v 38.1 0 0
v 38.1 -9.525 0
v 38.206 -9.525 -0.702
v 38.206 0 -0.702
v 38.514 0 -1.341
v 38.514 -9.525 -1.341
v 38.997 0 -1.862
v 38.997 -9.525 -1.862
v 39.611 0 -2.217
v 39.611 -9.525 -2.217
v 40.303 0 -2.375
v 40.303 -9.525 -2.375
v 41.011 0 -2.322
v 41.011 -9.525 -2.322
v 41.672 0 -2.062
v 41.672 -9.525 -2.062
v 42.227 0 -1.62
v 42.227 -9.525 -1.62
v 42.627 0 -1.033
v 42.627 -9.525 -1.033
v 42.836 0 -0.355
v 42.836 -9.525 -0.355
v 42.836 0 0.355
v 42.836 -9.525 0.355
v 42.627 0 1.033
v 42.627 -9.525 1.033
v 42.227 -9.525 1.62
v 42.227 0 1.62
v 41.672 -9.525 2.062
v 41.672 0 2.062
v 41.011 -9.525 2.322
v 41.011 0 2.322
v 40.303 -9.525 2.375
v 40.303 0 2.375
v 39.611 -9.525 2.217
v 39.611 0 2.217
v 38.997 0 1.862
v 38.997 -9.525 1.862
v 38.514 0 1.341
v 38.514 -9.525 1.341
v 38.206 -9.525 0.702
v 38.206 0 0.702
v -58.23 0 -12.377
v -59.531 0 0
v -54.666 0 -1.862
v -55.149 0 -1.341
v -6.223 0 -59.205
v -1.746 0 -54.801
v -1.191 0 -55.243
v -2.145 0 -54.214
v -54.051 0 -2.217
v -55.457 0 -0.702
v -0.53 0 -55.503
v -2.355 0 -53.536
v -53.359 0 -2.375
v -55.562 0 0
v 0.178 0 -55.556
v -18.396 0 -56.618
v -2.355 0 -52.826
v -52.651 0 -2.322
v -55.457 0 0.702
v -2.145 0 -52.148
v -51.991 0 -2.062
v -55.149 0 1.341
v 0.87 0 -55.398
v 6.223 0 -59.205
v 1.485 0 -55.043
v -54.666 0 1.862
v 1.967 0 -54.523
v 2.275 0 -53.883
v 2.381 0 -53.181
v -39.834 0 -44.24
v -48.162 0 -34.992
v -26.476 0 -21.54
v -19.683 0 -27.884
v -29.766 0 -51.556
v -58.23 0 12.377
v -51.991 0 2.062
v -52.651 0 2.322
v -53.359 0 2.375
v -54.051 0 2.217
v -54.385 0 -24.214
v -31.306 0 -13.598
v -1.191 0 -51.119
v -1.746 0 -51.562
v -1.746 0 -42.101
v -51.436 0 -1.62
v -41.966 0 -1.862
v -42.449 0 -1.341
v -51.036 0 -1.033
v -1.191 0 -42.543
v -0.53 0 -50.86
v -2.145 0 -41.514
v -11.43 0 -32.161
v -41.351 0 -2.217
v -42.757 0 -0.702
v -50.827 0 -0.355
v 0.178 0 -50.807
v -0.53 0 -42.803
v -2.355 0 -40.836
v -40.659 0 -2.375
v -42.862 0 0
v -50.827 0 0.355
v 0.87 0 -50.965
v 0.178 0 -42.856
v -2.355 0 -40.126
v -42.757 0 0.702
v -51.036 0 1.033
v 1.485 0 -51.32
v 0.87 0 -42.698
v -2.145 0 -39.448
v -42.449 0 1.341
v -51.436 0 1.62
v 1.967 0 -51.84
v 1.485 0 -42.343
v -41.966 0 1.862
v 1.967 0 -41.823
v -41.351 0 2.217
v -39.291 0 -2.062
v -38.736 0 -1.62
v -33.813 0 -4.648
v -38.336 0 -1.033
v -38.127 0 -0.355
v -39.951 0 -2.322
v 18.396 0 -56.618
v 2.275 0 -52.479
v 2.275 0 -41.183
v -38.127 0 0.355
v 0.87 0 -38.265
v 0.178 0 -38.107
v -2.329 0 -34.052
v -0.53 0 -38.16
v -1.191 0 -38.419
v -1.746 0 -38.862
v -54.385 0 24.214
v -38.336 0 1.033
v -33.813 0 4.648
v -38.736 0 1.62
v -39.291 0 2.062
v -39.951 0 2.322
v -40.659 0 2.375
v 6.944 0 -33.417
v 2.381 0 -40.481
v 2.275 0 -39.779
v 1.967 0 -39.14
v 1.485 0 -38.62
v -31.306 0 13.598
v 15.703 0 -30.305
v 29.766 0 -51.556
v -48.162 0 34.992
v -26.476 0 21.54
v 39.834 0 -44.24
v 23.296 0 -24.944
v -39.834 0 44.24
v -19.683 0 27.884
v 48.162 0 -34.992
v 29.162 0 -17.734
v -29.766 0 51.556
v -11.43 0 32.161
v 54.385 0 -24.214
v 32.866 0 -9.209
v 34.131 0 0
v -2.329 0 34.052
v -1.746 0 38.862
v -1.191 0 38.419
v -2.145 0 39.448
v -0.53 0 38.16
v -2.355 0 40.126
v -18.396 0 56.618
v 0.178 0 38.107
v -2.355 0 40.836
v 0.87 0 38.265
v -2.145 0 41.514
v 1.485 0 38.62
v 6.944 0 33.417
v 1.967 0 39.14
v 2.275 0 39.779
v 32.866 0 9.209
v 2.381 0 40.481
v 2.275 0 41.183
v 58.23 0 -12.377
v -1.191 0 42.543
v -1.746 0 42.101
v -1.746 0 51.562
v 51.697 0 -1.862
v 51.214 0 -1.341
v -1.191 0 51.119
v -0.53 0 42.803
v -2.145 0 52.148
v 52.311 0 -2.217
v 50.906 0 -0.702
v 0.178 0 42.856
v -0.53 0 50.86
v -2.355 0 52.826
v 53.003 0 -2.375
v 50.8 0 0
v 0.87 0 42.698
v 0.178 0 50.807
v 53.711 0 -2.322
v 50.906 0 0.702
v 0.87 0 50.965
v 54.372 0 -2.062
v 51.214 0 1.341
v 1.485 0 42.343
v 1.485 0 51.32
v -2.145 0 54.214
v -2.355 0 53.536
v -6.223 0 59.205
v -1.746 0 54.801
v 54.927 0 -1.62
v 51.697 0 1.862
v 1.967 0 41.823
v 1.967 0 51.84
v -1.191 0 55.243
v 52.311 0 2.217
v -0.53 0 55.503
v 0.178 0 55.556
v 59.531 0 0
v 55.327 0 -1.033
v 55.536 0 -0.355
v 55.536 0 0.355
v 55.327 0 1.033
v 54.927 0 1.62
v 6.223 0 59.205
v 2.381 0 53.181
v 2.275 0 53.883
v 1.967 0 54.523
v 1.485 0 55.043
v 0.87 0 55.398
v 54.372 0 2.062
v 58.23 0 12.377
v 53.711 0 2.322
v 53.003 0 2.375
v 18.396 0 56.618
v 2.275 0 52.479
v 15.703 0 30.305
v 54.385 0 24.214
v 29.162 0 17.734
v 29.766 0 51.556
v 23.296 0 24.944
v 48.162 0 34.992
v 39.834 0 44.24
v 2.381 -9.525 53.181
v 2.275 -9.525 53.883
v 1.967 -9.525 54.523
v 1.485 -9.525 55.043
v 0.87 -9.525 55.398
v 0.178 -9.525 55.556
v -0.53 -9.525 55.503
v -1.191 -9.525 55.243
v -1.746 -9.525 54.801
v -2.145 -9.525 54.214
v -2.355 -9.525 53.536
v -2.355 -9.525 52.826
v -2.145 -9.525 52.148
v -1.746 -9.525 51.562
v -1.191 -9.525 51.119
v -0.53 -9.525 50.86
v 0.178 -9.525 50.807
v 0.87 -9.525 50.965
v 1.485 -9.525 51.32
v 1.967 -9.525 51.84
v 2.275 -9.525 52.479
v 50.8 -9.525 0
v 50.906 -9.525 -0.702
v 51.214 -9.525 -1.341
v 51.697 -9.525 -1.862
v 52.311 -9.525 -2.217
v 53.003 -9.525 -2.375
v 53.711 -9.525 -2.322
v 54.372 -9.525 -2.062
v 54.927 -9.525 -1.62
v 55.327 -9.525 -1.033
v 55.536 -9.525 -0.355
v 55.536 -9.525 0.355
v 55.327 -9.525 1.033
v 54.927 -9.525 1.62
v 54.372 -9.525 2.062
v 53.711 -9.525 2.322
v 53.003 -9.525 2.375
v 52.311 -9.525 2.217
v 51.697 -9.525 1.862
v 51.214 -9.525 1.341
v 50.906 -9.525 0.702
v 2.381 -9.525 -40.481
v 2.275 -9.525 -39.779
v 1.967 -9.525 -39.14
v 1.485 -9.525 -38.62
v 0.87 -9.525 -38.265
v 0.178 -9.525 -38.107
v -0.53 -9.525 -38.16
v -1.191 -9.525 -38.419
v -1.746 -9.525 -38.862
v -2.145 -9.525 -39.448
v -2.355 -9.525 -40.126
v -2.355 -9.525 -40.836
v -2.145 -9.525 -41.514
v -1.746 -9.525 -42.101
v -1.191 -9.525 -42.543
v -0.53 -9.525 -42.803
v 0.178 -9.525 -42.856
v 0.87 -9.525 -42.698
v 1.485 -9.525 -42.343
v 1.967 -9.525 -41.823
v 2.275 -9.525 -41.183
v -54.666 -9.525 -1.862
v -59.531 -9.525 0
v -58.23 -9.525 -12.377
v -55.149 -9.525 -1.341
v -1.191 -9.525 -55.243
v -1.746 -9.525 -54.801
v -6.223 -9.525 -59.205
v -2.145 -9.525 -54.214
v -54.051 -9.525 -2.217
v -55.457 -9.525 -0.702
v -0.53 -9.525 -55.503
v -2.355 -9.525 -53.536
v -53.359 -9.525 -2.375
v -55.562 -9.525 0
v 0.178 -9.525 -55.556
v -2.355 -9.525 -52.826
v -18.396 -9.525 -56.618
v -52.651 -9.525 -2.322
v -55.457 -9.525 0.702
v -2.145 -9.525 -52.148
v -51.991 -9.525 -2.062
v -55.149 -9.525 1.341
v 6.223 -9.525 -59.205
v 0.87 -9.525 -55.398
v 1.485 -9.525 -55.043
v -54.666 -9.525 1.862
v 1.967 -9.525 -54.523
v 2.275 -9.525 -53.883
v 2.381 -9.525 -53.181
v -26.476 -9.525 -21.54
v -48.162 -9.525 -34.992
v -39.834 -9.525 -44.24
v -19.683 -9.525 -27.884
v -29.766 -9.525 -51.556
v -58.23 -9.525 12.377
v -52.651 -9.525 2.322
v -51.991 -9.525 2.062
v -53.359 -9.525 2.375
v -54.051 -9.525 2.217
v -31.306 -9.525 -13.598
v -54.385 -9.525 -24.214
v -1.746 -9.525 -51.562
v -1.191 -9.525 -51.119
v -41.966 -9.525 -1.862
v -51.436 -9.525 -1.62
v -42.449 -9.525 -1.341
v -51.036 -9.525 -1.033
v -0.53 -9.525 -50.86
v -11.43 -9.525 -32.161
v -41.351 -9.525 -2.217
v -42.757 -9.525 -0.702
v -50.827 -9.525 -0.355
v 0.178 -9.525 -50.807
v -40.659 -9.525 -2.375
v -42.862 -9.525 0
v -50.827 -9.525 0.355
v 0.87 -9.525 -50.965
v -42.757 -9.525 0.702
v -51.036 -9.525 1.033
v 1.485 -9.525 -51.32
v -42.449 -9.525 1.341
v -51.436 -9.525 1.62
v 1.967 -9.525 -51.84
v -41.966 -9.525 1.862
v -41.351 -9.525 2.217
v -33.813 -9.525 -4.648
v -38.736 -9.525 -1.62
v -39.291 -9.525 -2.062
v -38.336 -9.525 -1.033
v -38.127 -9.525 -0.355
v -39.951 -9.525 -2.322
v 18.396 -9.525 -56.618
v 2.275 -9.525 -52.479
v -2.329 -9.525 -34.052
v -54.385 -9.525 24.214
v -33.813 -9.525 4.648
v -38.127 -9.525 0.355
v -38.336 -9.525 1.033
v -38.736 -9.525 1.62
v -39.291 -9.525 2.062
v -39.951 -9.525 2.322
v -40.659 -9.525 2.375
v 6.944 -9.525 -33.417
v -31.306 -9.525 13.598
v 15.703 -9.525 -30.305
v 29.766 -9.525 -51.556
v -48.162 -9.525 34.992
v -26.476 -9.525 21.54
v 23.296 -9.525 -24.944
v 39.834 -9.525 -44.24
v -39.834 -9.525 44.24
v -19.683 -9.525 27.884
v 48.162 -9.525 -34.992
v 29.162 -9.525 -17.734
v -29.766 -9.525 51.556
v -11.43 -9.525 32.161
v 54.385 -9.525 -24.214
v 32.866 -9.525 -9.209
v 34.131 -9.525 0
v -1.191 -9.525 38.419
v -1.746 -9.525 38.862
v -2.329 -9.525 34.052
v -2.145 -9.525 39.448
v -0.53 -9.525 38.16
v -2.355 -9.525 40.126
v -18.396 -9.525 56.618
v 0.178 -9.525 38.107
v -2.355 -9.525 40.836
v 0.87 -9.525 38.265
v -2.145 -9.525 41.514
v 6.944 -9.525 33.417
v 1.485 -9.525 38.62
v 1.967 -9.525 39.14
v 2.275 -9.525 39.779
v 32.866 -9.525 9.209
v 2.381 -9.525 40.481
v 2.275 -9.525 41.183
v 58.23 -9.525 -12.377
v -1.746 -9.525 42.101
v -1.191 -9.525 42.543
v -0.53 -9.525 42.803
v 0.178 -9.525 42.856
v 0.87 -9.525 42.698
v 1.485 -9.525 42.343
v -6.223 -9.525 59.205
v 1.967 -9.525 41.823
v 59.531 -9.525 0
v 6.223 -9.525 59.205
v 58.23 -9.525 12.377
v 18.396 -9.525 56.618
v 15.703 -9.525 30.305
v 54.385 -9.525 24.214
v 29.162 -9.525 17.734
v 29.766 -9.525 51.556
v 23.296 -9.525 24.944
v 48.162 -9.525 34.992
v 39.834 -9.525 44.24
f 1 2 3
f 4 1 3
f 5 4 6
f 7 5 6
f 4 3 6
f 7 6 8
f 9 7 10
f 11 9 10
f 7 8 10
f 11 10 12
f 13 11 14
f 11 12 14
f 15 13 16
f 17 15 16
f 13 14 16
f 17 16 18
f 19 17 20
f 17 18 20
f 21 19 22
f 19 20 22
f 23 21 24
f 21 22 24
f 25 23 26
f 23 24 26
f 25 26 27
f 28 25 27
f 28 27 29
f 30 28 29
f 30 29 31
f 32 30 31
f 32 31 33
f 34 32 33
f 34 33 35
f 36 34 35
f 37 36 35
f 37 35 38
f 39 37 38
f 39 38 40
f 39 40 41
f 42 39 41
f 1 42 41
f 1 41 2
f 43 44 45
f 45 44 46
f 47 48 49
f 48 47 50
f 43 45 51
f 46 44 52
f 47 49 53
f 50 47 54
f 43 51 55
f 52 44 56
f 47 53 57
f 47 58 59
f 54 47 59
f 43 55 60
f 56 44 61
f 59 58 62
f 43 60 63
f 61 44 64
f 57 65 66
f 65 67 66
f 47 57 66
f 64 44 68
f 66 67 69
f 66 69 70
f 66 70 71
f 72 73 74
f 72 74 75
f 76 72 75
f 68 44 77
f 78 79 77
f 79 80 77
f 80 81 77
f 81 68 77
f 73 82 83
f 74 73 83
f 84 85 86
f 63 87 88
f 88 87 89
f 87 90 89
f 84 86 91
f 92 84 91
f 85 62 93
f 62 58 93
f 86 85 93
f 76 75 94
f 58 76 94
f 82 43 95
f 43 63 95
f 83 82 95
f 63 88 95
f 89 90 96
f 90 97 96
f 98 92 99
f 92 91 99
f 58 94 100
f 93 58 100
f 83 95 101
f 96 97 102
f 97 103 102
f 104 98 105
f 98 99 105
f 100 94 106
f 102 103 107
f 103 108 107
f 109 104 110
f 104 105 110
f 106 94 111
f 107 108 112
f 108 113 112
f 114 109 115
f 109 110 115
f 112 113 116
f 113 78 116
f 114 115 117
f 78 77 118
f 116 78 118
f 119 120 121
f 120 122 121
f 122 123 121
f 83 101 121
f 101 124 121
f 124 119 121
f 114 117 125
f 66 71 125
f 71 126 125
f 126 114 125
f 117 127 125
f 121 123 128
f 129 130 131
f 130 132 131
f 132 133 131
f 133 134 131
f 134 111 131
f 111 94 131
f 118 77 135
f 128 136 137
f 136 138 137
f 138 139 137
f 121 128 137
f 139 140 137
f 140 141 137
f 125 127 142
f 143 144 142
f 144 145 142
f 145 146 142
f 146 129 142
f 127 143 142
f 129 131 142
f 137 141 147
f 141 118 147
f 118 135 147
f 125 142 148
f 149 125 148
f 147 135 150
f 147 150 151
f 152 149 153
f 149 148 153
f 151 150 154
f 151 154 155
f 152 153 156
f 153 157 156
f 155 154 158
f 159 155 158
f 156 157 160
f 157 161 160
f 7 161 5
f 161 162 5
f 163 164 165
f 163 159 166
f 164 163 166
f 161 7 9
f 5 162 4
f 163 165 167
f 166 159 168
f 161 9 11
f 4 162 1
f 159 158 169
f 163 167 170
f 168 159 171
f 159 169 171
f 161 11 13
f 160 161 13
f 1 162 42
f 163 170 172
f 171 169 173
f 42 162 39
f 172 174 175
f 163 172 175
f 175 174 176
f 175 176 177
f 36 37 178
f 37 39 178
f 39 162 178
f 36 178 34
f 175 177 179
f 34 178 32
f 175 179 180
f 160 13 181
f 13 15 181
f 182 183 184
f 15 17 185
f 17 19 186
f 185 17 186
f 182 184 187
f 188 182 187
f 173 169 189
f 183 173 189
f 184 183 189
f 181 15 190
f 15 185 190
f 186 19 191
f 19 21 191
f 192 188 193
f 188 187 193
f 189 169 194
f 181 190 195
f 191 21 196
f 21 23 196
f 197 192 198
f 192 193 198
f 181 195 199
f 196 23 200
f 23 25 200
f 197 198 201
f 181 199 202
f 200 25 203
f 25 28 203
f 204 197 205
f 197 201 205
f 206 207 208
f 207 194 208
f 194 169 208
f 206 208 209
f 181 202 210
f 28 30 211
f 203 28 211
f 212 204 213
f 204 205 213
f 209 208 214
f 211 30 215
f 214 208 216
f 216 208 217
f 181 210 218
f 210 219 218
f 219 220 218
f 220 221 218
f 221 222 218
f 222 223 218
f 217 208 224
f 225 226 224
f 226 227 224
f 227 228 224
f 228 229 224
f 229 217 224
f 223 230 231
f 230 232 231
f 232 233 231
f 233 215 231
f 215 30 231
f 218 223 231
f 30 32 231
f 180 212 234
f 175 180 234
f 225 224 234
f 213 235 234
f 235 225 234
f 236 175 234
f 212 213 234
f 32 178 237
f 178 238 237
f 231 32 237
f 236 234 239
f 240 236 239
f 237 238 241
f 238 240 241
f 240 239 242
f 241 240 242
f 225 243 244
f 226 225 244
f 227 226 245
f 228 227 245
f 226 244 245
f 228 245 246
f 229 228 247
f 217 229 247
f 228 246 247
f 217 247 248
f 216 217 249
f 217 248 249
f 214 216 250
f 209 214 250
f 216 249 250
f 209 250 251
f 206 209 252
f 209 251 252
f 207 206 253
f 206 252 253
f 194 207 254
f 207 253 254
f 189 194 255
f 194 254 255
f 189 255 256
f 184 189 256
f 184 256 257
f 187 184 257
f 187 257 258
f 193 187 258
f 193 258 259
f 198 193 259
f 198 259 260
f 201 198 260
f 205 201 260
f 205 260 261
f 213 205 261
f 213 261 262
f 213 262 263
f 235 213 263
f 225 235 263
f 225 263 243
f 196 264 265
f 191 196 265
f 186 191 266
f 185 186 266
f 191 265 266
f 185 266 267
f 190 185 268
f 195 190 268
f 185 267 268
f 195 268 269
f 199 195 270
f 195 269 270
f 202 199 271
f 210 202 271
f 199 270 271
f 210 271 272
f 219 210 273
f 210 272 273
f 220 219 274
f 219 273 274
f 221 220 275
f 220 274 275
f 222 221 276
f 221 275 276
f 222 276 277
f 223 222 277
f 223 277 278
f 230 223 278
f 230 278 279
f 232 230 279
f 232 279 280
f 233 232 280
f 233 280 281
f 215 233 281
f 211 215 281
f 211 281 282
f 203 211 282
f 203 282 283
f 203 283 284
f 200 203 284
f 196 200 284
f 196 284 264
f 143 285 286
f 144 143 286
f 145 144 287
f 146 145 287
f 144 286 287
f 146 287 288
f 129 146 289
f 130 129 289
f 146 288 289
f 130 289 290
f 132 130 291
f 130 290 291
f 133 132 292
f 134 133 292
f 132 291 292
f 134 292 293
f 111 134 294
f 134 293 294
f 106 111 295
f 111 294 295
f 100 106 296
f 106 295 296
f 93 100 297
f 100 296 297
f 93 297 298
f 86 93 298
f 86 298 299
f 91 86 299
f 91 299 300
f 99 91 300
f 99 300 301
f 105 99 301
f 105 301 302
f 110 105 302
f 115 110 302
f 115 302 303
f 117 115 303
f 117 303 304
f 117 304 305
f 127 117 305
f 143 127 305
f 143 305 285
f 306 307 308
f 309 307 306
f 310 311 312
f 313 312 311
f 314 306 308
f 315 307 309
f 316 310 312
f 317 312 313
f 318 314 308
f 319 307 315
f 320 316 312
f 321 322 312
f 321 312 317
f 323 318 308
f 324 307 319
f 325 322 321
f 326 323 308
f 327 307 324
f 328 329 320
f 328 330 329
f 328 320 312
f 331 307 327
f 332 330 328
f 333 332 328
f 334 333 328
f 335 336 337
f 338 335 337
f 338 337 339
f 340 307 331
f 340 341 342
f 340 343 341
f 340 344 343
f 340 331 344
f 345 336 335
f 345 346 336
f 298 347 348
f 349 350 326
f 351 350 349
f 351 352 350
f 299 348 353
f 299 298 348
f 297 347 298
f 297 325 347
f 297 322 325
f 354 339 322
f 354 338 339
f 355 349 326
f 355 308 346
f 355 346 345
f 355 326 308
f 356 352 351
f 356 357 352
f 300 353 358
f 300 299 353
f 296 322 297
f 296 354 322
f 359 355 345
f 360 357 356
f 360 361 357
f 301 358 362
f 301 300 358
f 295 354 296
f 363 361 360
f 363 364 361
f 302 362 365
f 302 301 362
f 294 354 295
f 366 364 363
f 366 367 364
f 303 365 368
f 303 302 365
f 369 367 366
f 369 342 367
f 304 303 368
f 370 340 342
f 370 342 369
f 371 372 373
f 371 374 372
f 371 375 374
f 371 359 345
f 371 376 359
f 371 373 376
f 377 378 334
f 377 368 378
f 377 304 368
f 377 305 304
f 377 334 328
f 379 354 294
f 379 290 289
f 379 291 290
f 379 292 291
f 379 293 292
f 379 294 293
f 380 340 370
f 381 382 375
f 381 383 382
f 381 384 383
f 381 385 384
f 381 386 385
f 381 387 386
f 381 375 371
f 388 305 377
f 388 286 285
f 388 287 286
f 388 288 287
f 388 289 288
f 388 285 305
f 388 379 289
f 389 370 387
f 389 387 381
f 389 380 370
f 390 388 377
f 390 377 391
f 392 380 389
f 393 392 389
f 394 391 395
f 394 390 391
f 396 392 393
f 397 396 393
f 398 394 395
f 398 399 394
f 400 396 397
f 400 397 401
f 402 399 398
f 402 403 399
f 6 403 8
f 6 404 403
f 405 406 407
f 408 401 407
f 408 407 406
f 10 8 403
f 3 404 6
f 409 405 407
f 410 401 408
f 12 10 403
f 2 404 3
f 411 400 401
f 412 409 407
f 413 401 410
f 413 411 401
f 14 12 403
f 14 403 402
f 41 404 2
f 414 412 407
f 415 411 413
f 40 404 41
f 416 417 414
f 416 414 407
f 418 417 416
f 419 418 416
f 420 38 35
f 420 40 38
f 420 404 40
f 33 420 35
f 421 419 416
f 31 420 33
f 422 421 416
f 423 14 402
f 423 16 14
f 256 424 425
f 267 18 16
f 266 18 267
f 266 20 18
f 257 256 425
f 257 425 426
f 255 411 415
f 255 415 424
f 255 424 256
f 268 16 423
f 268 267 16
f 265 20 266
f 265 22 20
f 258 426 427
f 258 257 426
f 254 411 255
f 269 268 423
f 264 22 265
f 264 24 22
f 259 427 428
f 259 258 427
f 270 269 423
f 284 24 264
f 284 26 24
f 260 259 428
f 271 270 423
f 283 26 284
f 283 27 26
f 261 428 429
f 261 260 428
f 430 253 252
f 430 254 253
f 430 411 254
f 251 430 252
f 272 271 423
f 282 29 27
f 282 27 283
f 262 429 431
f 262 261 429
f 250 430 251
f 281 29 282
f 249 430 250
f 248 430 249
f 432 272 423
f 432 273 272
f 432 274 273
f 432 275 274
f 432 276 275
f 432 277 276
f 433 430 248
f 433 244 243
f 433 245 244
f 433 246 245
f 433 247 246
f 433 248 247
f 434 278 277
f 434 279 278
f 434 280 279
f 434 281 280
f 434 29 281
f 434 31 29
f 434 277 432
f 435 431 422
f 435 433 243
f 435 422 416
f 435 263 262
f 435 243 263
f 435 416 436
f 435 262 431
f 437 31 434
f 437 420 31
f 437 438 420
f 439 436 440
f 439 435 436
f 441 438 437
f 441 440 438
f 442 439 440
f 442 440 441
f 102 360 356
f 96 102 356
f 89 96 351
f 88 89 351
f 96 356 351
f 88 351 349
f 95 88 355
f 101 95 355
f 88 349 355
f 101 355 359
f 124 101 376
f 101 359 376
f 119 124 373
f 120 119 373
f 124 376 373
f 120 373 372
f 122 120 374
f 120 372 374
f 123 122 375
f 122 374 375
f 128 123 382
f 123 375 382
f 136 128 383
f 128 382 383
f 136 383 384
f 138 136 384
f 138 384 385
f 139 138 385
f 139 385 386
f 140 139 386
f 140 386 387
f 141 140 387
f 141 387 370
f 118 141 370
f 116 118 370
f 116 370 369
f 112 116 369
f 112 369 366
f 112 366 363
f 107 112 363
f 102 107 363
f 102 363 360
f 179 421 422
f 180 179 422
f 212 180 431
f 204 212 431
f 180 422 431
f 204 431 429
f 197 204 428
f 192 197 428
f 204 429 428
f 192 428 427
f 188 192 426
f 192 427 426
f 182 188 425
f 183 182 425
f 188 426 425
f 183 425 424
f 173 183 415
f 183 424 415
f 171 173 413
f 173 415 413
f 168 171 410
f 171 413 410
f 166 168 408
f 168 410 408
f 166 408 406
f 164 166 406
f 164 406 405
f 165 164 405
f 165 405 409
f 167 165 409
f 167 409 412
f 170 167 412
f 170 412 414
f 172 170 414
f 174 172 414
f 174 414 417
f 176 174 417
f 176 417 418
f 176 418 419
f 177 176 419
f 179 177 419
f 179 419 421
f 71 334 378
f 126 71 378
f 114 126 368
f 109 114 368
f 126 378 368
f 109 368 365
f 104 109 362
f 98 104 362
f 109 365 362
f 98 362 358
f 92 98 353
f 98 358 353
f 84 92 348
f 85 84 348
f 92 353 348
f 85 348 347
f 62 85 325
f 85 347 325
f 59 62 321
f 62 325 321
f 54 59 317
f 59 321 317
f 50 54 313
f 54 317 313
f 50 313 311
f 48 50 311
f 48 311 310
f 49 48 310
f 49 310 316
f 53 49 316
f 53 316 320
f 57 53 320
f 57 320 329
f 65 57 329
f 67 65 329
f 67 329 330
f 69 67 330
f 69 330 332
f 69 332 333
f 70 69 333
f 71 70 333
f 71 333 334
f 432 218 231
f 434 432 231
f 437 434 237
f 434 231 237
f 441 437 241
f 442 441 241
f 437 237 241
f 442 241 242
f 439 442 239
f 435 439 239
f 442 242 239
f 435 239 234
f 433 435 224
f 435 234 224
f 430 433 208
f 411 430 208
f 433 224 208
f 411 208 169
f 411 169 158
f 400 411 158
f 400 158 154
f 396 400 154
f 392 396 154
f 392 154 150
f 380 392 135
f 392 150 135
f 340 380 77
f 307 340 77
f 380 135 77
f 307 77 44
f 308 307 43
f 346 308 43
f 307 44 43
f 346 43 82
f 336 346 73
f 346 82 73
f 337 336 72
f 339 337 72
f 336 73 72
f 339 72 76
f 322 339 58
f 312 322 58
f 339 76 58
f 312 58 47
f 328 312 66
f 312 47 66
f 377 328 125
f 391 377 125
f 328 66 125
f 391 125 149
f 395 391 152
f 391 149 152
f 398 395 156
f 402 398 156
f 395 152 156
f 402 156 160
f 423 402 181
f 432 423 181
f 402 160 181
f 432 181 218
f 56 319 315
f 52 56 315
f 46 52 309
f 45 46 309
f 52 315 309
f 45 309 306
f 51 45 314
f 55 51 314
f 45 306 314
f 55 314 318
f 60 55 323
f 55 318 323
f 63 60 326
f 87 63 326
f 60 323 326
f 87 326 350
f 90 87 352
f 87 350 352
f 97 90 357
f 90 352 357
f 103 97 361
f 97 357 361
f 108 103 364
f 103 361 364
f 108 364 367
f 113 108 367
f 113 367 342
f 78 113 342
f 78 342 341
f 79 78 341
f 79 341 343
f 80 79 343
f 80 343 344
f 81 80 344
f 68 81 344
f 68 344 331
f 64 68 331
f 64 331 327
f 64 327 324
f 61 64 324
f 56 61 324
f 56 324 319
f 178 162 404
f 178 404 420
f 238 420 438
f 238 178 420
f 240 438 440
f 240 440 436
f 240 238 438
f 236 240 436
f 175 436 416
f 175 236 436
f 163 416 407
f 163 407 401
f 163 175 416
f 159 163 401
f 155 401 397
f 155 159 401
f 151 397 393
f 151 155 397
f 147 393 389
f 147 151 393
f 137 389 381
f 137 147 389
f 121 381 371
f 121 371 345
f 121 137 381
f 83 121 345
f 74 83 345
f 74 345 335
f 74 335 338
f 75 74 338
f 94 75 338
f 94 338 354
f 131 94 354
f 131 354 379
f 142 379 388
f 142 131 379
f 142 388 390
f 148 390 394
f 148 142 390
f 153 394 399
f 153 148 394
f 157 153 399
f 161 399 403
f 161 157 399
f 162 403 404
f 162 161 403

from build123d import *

# Parameters (mm, degrees)
F0_R     = 59.53125
F0_R_2   = 46.83125
F0_R_3   = 34.13125
F1_DEPTH = 9.525
F3_DEPTH = 25.4


with BuildPart() as f1:
    # F0 (on Front) → F1 (new body)
    with BuildSketch(Plane.XZ):
        Circle(F0_R)
        Circle(F0_R_2, mode=Mode.SUBTRACT)
        Circle(F0_R_2)
        Circle(F0_R_3, mode=Mode.SUBTRACT)
    extrude(amount=F1_DEPTH)

    # F2 (on face) → F3 (cut)
    with BuildSketch(Plane.XZ.offset(9.525)):
        with BuildLine():
            Line((38.1, 0), (42.8625, 0))
            ThreePointArc((42.8625, 0), (40.48125, 2.38125), (38.1, 0))
        make_face()
        with BuildLine():
            ThreePointArc((38.1, 0), (40.48125, -2.38125), (42.8625, 0))
            Line((42.8625, 0), (38.1, 0))
        make_face()
        with BuildLine():
            ThreePointArc((55.5625, 0), (53.18125, 2.38125), (50.8, 0))
            Line((50.8, 0), (55.5625, 0))
        make_face()
        with BuildLine():
            Line((55.5625, 0), (50.8, 0))
            ThreePointArc((50.8, 0), (53.18125, -2.38125), (55.5625, 0))
        make_face()
        with BuildLine():
            ThreePointArc((0, -38.1), (-2.38125, -40.48125), (0, -42.8625))
            Line((0, -42.8625), (0, -38.1))
        make_face()
        with BuildLine():
            Line((0, -38.1), (0, -42.8625))
            ThreePointArc((0, -42.8625), (1.6837980227, -42.1650480227), (2.38125, -40.48125))
            ThreePointArc((2.38125, -40.48125), (1.6837980227, -38.7974519773), (0, -38.1))
        make_face()
        with BuildLine():
            Line((0, -55.5625), (0, -50.8))
            ThreePointArc((0, -50.8), (-2.38125, -53.18125), (0, -55.5625))
        make_face()
        with BuildLine():
            ThreePointArc((2.38125, -53.18125), (1.6837980227, -51.4974519773), (0, -50.8))
            Line((0, -50.8), (0, -55.5625))
            ThreePointArc((0, -55.5625), (1.6837980227, -54.8650480227), (2.38125, -53.18125))
        make_face()
        with BuildLine():
            ThreePointArc((-38.1, 0), (-40.48125, 2.38125), (-42.8625, 0))
            Line((-42.8625, 0), (-38.1, 0))
        make_face()
        with BuildLine():
            Line((-38.1, 0), (-42.8625, 0))
            ThreePointArc((-42.8625, 0), (-40.48125, -2.38125), (-38.1, 0))
        make_face()
        with BuildLine():
            Line((-55.5625, 0), (-50.8, 0))
            ThreePointArc((-50.8, 0), (-53.18125, 2.38125), (-55.5625, 0))
        make_face()
        with BuildLine():
            ThreePointArc((-55.5625, 0), (-53.18125, -2.38125), (-50.8, 0))
            Line((-50.8, 0), (-55.5625, 0))
        make_face()
        with BuildLine():
            ThreePointArc((0, 55.5625), (-2.38125, 53.18125), (0, 50.8))
            Line((0, 50.8), (0, 55.5625))
        make_face()
        with BuildLine():
            Line((0, 55.5625), (0, 50.8))
            ThreePointArc((0, 50.8), (1.6837980227, 51.4974519773), (2.38125, 53.18125))
            ThreePointArc((2.38125, 53.18125), (1.6837980227, 54.8650480227), (0, 55.5625))
        make_face()
        with BuildLine():
            ThreePointArc((2.38125, 40.48125), (1.6837980227, 42.1650480227), (0, 42.8625))
            Line((0, 42.8625), (0, 38.1))
            ThreePointArc((0, 38.1), (1.6837980227, 38.7974519773), (2.38125, 40.48125))
        make_face()
        with BuildLine():
            Line((0, 38.1), (0, 42.8625))
            ThreePointArc((0, 42.8625), (-2.38125, 40.48125), (0, 38.1))
        make_face()
    extrude(amount=-F3_DEPTH, mode=Mode.SUBTRACT)


solid = f1.part
